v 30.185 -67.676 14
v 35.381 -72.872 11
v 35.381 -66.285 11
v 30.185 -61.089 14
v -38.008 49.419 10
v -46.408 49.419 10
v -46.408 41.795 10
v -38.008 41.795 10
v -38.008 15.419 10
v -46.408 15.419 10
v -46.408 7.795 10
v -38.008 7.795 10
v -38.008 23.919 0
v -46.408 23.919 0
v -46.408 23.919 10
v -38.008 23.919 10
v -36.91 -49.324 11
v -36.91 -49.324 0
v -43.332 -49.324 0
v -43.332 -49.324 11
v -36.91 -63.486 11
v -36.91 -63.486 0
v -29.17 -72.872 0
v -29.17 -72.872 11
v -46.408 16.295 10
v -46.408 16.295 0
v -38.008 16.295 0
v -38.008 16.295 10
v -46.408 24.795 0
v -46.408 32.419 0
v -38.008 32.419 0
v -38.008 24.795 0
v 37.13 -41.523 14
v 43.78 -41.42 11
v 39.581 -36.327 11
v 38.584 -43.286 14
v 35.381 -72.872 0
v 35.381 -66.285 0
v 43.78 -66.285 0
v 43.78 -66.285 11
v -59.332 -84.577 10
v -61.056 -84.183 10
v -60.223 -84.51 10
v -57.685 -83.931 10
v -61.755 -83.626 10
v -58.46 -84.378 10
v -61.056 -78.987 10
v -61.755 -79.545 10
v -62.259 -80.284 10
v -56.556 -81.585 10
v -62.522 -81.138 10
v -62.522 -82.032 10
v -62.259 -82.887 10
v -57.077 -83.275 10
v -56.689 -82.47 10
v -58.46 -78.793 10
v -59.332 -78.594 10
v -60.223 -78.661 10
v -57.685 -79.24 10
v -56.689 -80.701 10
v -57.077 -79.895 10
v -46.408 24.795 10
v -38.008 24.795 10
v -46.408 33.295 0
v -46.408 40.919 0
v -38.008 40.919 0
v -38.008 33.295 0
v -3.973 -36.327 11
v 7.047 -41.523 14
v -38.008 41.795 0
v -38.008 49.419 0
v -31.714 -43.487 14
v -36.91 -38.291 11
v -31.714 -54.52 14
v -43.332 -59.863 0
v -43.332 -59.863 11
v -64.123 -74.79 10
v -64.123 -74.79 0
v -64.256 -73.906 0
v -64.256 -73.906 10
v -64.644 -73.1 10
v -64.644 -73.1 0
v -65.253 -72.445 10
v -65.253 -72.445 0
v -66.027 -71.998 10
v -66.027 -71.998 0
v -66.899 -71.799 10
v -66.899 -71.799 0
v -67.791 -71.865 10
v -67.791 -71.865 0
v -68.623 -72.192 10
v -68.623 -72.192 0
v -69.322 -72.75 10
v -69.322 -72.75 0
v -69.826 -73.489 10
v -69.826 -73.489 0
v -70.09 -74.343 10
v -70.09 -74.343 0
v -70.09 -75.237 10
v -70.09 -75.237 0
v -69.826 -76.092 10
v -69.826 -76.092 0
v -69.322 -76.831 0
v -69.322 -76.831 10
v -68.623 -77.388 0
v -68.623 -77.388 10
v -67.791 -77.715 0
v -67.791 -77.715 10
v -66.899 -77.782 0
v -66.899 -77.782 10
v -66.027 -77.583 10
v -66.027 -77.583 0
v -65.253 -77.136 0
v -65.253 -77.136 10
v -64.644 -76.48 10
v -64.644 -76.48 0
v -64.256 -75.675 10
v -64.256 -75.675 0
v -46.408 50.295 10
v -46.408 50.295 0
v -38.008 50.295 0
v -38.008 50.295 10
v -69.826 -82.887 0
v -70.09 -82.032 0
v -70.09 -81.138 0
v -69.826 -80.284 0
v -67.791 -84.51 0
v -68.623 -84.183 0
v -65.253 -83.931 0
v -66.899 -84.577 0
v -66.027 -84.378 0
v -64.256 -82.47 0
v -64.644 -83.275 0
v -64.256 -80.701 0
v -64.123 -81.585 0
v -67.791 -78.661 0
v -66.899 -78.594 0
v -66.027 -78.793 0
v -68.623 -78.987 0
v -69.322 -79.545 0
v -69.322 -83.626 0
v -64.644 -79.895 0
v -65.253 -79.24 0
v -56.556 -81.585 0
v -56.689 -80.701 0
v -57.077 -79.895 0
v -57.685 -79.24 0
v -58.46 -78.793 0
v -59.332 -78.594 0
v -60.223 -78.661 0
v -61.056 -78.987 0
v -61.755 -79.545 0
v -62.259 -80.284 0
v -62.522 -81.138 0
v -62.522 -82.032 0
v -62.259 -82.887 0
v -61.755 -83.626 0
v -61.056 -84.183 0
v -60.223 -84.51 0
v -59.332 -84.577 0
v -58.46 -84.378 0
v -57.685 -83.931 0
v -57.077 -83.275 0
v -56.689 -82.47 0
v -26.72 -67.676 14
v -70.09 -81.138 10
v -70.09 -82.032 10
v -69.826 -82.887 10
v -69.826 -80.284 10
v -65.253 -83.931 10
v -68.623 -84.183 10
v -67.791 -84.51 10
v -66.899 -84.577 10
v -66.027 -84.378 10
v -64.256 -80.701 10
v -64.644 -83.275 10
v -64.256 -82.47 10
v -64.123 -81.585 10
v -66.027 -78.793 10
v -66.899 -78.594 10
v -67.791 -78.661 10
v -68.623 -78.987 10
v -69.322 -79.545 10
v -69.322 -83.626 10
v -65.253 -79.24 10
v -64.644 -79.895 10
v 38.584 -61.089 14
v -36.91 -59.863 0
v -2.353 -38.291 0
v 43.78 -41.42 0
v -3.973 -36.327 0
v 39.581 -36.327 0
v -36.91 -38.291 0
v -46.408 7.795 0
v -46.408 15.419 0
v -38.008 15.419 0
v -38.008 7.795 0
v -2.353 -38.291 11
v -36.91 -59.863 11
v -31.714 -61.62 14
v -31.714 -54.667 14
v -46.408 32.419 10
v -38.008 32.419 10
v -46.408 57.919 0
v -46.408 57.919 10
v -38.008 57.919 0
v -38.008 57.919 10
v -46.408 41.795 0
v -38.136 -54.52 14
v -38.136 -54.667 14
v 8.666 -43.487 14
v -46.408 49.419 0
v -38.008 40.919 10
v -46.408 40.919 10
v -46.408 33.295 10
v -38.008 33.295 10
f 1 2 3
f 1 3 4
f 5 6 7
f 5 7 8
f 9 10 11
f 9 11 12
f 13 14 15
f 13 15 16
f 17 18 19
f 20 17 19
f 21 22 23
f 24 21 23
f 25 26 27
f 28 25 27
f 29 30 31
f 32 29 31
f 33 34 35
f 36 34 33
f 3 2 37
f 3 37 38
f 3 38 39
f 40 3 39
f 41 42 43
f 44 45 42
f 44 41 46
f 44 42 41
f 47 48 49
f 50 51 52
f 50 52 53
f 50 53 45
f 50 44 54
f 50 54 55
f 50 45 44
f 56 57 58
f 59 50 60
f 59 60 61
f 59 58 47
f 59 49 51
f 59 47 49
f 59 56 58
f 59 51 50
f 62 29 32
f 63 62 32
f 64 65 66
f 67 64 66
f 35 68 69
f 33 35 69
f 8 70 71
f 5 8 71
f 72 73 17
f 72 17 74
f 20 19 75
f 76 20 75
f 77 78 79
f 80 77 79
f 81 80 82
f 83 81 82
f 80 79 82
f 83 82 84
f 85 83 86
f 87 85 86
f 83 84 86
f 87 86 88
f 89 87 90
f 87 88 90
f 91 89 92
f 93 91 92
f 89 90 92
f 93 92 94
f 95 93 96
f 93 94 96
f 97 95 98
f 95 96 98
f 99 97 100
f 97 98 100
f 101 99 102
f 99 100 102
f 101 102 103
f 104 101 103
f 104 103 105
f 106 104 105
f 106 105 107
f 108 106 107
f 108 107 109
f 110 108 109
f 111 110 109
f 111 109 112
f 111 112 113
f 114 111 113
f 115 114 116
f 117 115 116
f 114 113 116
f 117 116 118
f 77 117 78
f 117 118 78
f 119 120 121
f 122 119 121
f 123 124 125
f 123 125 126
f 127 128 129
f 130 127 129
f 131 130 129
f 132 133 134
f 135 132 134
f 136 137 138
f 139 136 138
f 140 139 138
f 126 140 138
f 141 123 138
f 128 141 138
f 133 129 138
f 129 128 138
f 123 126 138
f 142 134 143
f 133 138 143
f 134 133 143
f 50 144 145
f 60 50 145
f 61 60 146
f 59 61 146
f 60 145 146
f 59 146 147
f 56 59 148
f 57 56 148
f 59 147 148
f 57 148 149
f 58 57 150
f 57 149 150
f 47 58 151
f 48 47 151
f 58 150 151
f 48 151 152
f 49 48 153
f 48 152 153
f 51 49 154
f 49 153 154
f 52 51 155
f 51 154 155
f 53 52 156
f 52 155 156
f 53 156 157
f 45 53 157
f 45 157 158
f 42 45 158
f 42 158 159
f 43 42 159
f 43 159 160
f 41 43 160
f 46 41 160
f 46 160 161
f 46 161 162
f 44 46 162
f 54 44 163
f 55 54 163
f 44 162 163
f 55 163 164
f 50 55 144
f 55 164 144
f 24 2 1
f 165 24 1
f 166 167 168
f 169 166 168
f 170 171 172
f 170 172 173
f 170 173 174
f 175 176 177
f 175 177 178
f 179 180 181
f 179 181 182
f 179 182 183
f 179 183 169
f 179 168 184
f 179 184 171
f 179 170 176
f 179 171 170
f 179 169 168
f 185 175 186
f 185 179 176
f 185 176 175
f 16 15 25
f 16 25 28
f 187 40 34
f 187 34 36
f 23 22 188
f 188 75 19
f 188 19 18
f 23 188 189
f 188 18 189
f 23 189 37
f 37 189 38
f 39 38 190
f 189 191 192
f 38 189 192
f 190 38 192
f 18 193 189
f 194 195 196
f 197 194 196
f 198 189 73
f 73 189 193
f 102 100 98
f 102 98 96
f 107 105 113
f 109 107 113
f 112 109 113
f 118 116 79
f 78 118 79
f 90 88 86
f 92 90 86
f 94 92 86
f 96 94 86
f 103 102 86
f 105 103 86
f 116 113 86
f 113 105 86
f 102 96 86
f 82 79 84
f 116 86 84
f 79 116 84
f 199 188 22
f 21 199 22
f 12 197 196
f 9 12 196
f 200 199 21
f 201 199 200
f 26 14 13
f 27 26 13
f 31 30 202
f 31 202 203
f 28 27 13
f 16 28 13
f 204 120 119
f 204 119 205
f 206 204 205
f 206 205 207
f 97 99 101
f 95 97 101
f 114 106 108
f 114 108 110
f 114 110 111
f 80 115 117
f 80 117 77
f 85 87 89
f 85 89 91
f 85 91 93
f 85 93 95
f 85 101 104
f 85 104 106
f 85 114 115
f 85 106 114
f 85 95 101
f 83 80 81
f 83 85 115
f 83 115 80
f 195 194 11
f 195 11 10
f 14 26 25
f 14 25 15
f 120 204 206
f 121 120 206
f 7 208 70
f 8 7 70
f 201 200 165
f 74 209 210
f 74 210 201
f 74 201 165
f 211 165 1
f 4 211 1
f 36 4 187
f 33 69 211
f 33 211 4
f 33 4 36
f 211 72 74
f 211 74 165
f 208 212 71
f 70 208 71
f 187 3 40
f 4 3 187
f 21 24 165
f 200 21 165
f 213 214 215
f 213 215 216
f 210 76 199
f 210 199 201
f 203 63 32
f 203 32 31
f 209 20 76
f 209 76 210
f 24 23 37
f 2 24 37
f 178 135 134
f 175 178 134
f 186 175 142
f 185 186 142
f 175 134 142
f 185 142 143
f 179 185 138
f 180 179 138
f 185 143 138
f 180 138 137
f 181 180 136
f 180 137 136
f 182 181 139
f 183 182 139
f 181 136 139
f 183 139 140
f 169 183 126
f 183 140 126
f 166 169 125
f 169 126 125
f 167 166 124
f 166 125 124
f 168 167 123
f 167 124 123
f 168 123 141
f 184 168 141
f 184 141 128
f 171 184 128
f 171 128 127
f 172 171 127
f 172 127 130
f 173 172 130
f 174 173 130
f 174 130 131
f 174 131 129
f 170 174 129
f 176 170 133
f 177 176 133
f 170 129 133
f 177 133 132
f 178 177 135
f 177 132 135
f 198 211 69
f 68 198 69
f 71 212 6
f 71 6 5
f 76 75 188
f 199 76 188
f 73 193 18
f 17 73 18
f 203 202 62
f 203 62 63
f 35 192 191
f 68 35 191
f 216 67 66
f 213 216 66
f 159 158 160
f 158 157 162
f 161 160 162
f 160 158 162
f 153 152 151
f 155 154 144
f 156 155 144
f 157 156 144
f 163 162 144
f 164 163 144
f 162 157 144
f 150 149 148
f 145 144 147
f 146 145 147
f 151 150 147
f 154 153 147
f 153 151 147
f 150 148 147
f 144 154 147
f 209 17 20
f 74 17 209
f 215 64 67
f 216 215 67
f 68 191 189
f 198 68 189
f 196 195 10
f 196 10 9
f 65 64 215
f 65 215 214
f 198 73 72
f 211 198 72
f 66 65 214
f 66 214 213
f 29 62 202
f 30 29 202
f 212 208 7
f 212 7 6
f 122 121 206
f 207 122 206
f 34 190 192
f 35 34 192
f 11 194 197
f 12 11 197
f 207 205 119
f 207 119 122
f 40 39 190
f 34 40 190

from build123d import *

# Parameters (mm, degrees)
EXTRUDE_1_DEPTH   = 14
SKETCH_2_R        = 3
EXTRUDE_2_DEPTH   = 10
EXTRUDE_2_2_DEPTH = 10
EXTRUDE_2_3_DEPTH = 10
SKETCH_2_W        = 8.399311933
SKETCH_2_H        = 7.623990832
EXTRUDE_2_4_DEPTH = 10
EXTRUDE_2_5_DEPTH = 10
EXTRUDE_2_6_DEPTH = 10
EXTRUDE_2_7_DEPTH = 10
EXTRUDE_2_8_DEPTH = 10
EXTRUDE_2_9_DEPTH = 10


with BuildPart() as part:
    # Эскиз1 → Бобышка-Вытянуть1 (new body)
    with BuildSketch(Plane.XY):
        Polygon((-36.909889511, -38.291088482), (-36.909889511, -49.324157276), (-43.332123585, -49.324157276), (-43.332123585, -59.863208064), (-36.909889511, -59.863208064), (-36.909889511, -63.486006772), (-29.170274088, -72.87234888), (35.381411989, -72.87234888), (35.381411989, -66.285442138), (43.779718086, -66.285442138), (43.779718086, -41.419869184), (39.580565037, -36.327279317), (-3.972709406, -36.327279317), (-2.353428165, -38.291088482), align=None)
    extrude(amount=EXTRUDE_1_DEPTH)

    # Фаска1
    # the kernel refuses this chamfer: 5.196152423, 3 mm, written as the material it takes off along each edge
    with BuildSketch(Plane(origin=(-36.909889511, -49.324157276, 14), x_dir=(0, 0.0578938624026709, -0.9983227437537926), z_dir=(-1, 0, 0)), Plane(origin=(-43.332123585, -59.863208064, 14), x_dir=(0, -0.0578938624026709, -0.9983227437537926), z_dir=(1, 0, 0))) as chamfer_1_piece_1:
        with BuildLine():
            Line((3.109137869, 0), (-0.414994971, 5.361118731))
            Line((-0.414994971, 5.361118731), (-0.518743714, 5.355102224))
            ThreePointArc((-0.518743714, 5.355102224), (-0.259371857, 2.677551112), (-0.103748743, -0.006016507))
            Line((-0.103748743, -0.006016507), (0.006016507, -0.103748743))
            ThreePointArc((0.006016507, -0.103748743), (1.555374994, -0.013899696), (3.115154376, -0.103748743))
            Line((3.115154376, -0.103748743), (3.109137869, 0))
        make_face()
    extrude(amount=6.422234074, mode=Mode.SUBTRACT)
    with BuildSketch(Plane(origin=(-43.332123585, -49.324157276, 14), x_dir=(-0.0578938624026709, 0, -0.9983227437537926), z_dir=(0, -1, 0))) as chamfer_1_piece_2:
        with BuildLine():
            Line((3.109137869, 0), (-0.414994971, 5.361118731))
            Line((-0.414994971, 5.361118731), (-0.518743714, 5.355102224))
            ThreePointArc((-0.518743714, 5.355102224), (-0.259371857, 2.677551112), (-0.103748743, -0.006016507))
            Line((-0.103748743, -0.006016507), (0.006016507, -0.103748743))
            ThreePointArc((0.006016507, -0.103748743), (1.555374994, -0.013899696), (3.115154376, -0.103748743))
            Line((3.115154376, -0.103748743), (3.109137869, 0))
        make_face()
    extrude(amount=10.539050788, mode=Mode.SUBTRACT)
    with BuildSketch(Plane(origin=(-36.909889511, -59.863208064, 14), x_dir=(-0.0578938624026709, 0, -0.9983227437537926), z_dir=(0, -1, 0))) as chamfer_1_piece_3_section:
        with BuildLine():
            Line((3.109137869, 0), (-0.414994971, 5.361118731))
            Line((-0.414994971, 5.361118731), (-0.518743714, 5.355102224))
            ThreePointArc((-0.518743714, 5.355102224), (-0.259371857, 2.677551112), (-0.103748743, -0.006016507))
            Line((-0.103748743, -0.006016507), (0.006016507, -0.103748743))
            ThreePointArc((0.006016507, -0.103748743), (1.555374994, -0.013899696), (3.115154376, -0.103748743))
            Line((3.115154376, -0.103748743), (3.109137869, 0))
        make_face()
    chamfer_1_piece_3 = extrude(amount=17.06569062, mode=Mode.PRIVATE)
    chamfer_1_piece_3 = split(chamfer_1_piece_3, bisect_by=Plane(origin=(-36.310735652, -64.212640175, 13.15573984), z_dir=(0.7715393663129642, 0.6361815827492885, 0)), keep=Keep.TOP, mode=Mode.PRIVATE)
    add(chamfer_1_piece_3, mode=Mode.SUBTRACT)
    with BuildSketch(Plane(origin=(-45.462009764, -53.114286465, 14), x_dir=(-0.04466739391156679, -0.03683100901480082, -0.9983227437537926), z_dir=(0.6361815827492885, -0.7715393663129642, 0))) as chamfer_1_piece_4_section:
        with BuildLine():
            Line((3.109137869, 0), (-0.414994971, 5.361118731))
            Line((-0.414994971, 5.361118731), (-0.518743714, 5.355102224))
            ThreePointArc((-0.518743714, 5.355102224), (-0.259371857, 2.677551112), (-0.103748743, -0.006016507))
            Line((-0.103748743, -0.006016507), (0.006016507, -0.103748743))
            ThreePointArc((0.006016507, -0.103748743), (1.555374994, -0.013899696), (3.115154376, -0.103748743))
            Line((3.115154376, -0.103748743), (3.109137869, 0))
        make_face()
    chamfer_1_piece_4 = extrude(amount=39.051517055, mode=Mode.PRIVATE)
    chamfer_1_piece_4 = split(chamfer_1_piece_4, bisect_by=Plane(origin=(-36.909889511, -66.628217191, 13.110188551), z_dir=(1, 0, 0)), keep=Keep.TOP, mode=Mode.PRIVATE)
    chamfer_1_piece_4 = split(chamfer_1_piece_4, bisect_by=Plane(origin=(-31.761219521, -72.87234888, 13.110188551), z_dir=(0, 1, 0)), keep=Keep.TOP, mode=Mode.PRIVATE)
    add(chamfer_1_piece_4, mode=Mode.SUBTRACT)
    with BuildSketch(Plane(origin=(-42.613166, -72.87234888, 14), x_dir=(0, -0.05789386240267318, -0.9983227437537925), z_dir=(1, 0, 0))) as chamfer_1_piece_5_section:
        with BuildLine():
            Line((3.109137869, 0), (-0.414994971, 5.361118731))
            Line((-0.414994971, 5.361118731), (-0.518743714, 5.355102224))
            ThreePointArc((-0.518743714, 5.355102224), (-0.259371857, 2.677551112), (-0.103748743, -0.006016507))
            Line((-0.103748743, -0.006016507), (0.006016507, -0.103748743))
            ThreePointArc((0.006016507, -0.103748743), (1.555374994, -0.013899696), (3.115154376, -0.103748743))
            Line((3.115154376, -0.103748743), (3.109137869, 0))
        make_face()
    chamfer_1_piece_5 = extrude(amount=77.994577989, mode=Mode.PRIVATE)
    chamfer_1_piece_5 = split(chamfer_1_piece_5, bisect_by=Plane(origin=(-17.2681662, -87.306820149, 13.044949629), z_dir=(0.7715393663129642, 0.6361815827492885, 0)), keep=Keep.TOP, mode=Mode.PRIVATE)
    add(chamfer_1_piece_5, mode=Mode.SUBTRACT)
    with BuildSketch(Plane(origin=(35.381411989, -72.87234888, 14), x_dir=(0.0578938624026709, 0, -0.9983227437537926), z_dir=(0, 1, 0))) as chamfer_1_piece_6:
        with BuildLine():
            Line((3.109137869, 0), (-0.414994971, 5.361118731))
            Line((-0.414994971, 5.361118731), (-0.518743714, 5.355102224))
            ThreePointArc((-0.518743714, 5.355102224), (-0.259371857, 2.677551112), (-0.103748743, -0.006016507))
            Line((-0.103748743, -0.006016507), (0.006016507, -0.103748743))
            ThreePointArc((0.006016507, -0.103748743), (1.555374994, -0.013899696), (3.115154376, -0.103748743))
            Line((3.115154376, -0.103748743), (3.109137869, 0))
        make_face()
    extrude(amount=6.586906743, mode=Mode.SUBTRACT)
    with BuildSketch(Plane(origin=(35.381411989, -66.285442138, 14), x_dir=(0, -0.05789386240267318, -0.9983227437537925), z_dir=(1, 0, 0))) as chamfer_1_piece_7:
        with BuildLine():
            Line((3.109137869, 0), (-0.414994971, 5.361118731))
            Line((-0.414994971, 5.361118731), (-0.518743714, 5.355102224))
            ThreePointArc((-0.518743714, 5.355102224), (-0.259371857, 2.677551112), (-0.103748743, -0.006016507))
            Line((-0.103748743, -0.006016507), (0.006016507, -0.103748743))
            ThreePointArc((0.006016507, -0.103748743), (1.555374994, -0.013899696), (3.115154376, -0.103748743))
            Line((3.115154376, -0.103748743), (3.109137869, 0))
        make_face()
    extrude(amount=8.398306097, mode=Mode.SUBTRACT)
    with BuildSketch(Plane(origin=(43.779718086, -66.285442138, 14), x_dir=(0.0578938624026709, 0, -0.9983227437537926), z_dir=(0, 1, 0))) as chamfer_1_piece_8_section:
        with BuildLine():
            Line((3.109137869, 0), (-0.414994971, 5.361118731))
            Line((-0.414994971, 5.361118731), (-0.518743714, 5.355102224))
            ThreePointArc((-0.518743714, 5.355102224), (-0.259371857, 2.677551112), (-0.103748743, -0.006016507))
            Line((-0.103748743, -0.006016507), (0.006016507, -0.103748743))
            ThreePointArc((0.006016507, -0.103748743), (1.555374994, -0.013899696), (3.115154376, -0.103748743))
            Line((3.115154376, -0.103748743), (3.109137869, 0))
        make_face()
    chamfer_1_piece_8 = extrude(amount=38.308464865, mode=Mode.PRIVATE)
    chamfer_1_piece_8 = split(chamfer_1_piece_8, bisect_by=Plane(origin=(48.602023871, -47.268197478, 13.0630262), z_dir=(-0.7715393663129643, -0.6361815827492884, 0)), keep=Keep.TOP, mode=Mode.PRIVATE)
    add(chamfer_1_piece_8, mode=Mode.SUBTRACT)
    with BuildSketch(Plane(origin=(52.331838339, -51.791589491, 14), x_dir=(0.04466739391156704, 0.036831009014801006, -0.9983227437537926), z_dir=(-0.6361815827492884, 0.7715393663129643, 0))) as chamfer_1_piece_9_section:
        with BuildLine():
            Line((3.109137869, 0), (-0.414994971, 5.361118731))
            Line((-0.414994971, 5.361118731), (-0.518743714, 5.355102224))
            ThreePointArc((-0.518743714, 5.355102224), (-0.259371857, 2.677551112), (-0.103748743, -0.006016507))
            Line((-0.103748743, -0.006016507), (0.006016507, -0.103748743))
            ThreePointArc((0.006016507, -0.103748743), (1.555374994, -0.013899696), (3.115154376, -0.103748743))
            Line((3.115154376, -0.103748743), (3.109137869, 0))
        make_face()
    chamfer_1_piece_9 = extrude(amount=33.486341215, mode=Mode.PRIVATE)
    chamfer_1_piece_9 = split(chamfer_1_piece_9, bisect_by=Plane(origin=(43.779718086, -40.523934217, 13.149770443), z_dir=(-1, 0, 0)), keep=Keep.TOP, mode=Mode.PRIVATE)
    chamfer_1_piece_9 = split(chamfer_1_piece_9, bisect_by=Plane(origin=(40.319318432, -36.327279317, 13.149770443), z_dir=(0, -1, 0)), keep=Keep.TOP, mode=Mode.PRIVATE)
    add(chamfer_1_piece_9, mode=Mode.SUBTRACT)
    with BuildSketch(Plane(origin=(11.089463747, -38.291088482, 14), x_dir=(0, 0.0578938624026709, -0.9983227437537926), z_dir=(-1, 0, 0))) as chamfer_1_piece_10_section:
        with BuildLine():
            Line((3.109137869, 0), (-0.414994971, 5.361118731))
            Line((-0.414994971, 5.361118731), (-0.518743714, 5.355102224))
            ThreePointArc((-0.518743714, 5.355102224), (-0.259371857, 2.677551112), (-0.103748743, -0.006016507))
            Line((-0.103748743, -0.006016507), (0.006016507, -0.103748743))
            ThreePointArc((0.006016507, -0.103748743), (1.555374994, -0.013899696), (3.115154376, -0.103748743))
            Line((3.115154376, -0.103748743), (3.109137869, 0))
        make_face()
    chamfer_1_piece_10 = extrude(amount=47.999353257, mode=Mode.PRIVATE)
    chamfer_1_piece_10 = split(chamfer_1_piece_10, bisect_by=Plane(origin=(-8.173409607, -31.232813116, 13.050749195), z_dir=(-0.7715393663129635, -0.6361815827492894, 0)), keep=Keep.TOP, mode=Mode.PRIVATE)
    add(chamfer_1_piece_10, mode=Mode.SUBTRACT)
    with BuildSketch(Plane(origin=(53.023456949, -36.327279317, 14), x_dir=(0, 0.0578938624026709, -0.9983227437537926), z_dir=(-1, 0, 0))) as chamfer_1_piece_11_section:
        with BuildLine():
            Line((3.109137869, 0), (-0.414994971, 5.361118731))
            Line((-0.414994971, 5.361118731), (-0.518743714, 5.355102224))
            ThreePointArc((-0.518743714, 5.355102224), (-0.259371857, 2.677551112), (-0.103748743, -0.006016507))
            Line((-0.103748743, -0.006016507), (0.006016507, -0.103748743))
            ThreePointArc((0.006016507, -0.103748743), (1.555374994, -0.013899696), (3.115154376, -0.103748743))
            Line((3.115154376, -0.103748743), (3.109137869, 0))
        make_face()
    chamfer_1_piece_11 = extrude(amount=70.439058267, mode=Mode.PRIVATE)
    chamfer_1_piece_11 = split(chamfer_1_piece_11, bisect_by=Plane(origin=(32.203932865, -27.381150939, 13.037990314), z_dir=(-0.7715393663129643, -0.6361815827492884, 0)), keep=Keep.TOP, mode=Mode.PRIVATE)
    chamfer_1_piece_11 = split(chamfer_1_piece_11, bisect_by=Plane(origin=(6.277844799, -48.758802502, 13.037990314), z_dir=(0.7715393663129635, 0.6361815827492894, 0)), keep=Keep.TOP, mode=Mode.PRIVATE)
    add(chamfer_1_piece_11, mode=Mode.SUBTRACT)
    with BuildSketch(Plane(origin=(-12.524829659, -25.95555901, 14), x_dir=(-0.04466739391156709, -0.03683100901480115, -0.9983227437537926), z_dir=(0.6361815827492894, -0.7715393663129635, 0))) as chamfer_1_piece_12_section:
        with BuildLine():
            Line((3.109137869, 0), (-0.414994971, 5.361118731))
            Line((-0.414994971, 5.361118731), (-0.518743714, 5.355102224))
            ThreePointArc((-0.518743714, 5.355102224), (-0.259371857, 2.677551112), (-0.103748743, -0.006016507))
            Line((-0.103748743, -0.006016507), (0.006016507, -0.103748743))
            ThreePointArc((0.006016507, -0.103748743), (1.555374994, -0.013899696), (3.115154376, -0.103748743))
            Line((3.115154376, -0.103748743), (3.109137869, 0))
        make_face()
    chamfer_1_piece_12 = extrude(amount=29.431096805, mode=Mode.PRIVATE)
    chamfer_1_piece_12 = split(chamfer_1_piece_12, bisect_by=Plane(origin=(-6.345177041, -38.291088482, 13.06885324), z_dir=(0, 1, 0)), keep=Keep.TOP, mode=Mode.PRIVATE)
    add(chamfer_1_piece_12, mode=Mode.SUBTRACT)
    with BuildSketch(Plane(origin=(-36.909889511, -38.291088482, 14), x_dir=(-0.0578938624026709, 0, -0.9983227437537926), z_dir=(0, -1, 0))) as chamfer_1_piece_13:
        with BuildLine():
            Line((3.109137869, 0), (-0.414994971, 5.361118731))
            Line((-0.414994971, 5.361118731), (-0.518743714, 5.355102224))
            ThreePointArc((-0.518743714, 5.355102224), (-0.259371857, 2.677551112), (-0.103748743, -0.006016507))
            Line((-0.103748743, -0.006016507), (0.006016507, -0.103748743))
            ThreePointArc((0.006016507, -0.103748743), (1.555374994, -0.013899696), (3.115154376, -0.103748743))
            Line((3.115154376, -0.103748743), (3.109137869, 0))
        make_face()
    extrude(amount=11.033068794, mode=Mode.SUBTRACT)
    with BuildSketch(Plane(origin=(-36.909889511, -38.291088482, 14), x_dir=(-0.0578938624026709, 0, -0.9983227437537926), z_dir=(0, -1, 0))) as chamfer_1_piece_14a_section:
        with BuildLine():
            Line((3.109137869, 0), (-0.414994971, 5.361118731))
            Line((-0.414994971, 5.361118731), (-0.518743714, 5.355102224))
            ThreePointArc((-0.518743714, 5.355102224), (-0.259371857, 2.677551112), (-0.103748743, -0.006016507))
            Line((-0.103748743, -0.006016507), (0.006016507, -0.103748743))
            ThreePointArc((0.006016507, -0.103748743), (1.555374994, -0.013899696), (3.115154376, -0.103748743))
            Line((3.115154376, -0.103748743), (3.109137869, 0))
        make_face()
    chamfer_1_piece_14a = extrude(amount=24.475960706, mode=Mode.PRIVATE)
    chamfer_1_piece_14a = split(chamfer_1_piece_14a, bisect_by=Plane(origin=(-35.167192108, -49.324157276, 13.037990314), z_dir=(0, -1, 0)), keep=Keep.TOP, mode=Mode.PRIVATE)
    with BuildSketch(Plane(origin=(-23.466997599, -49.324157276, 14), x_dir=(0, 0.0578938624026709, -0.9983227437537926), z_dir=(-1, 0, 0))) as chamfer_1_piece_14b_section:
        with BuildLine():
            Line((3.109137869, 0), (-0.414994971, 5.361118731))
            Line((-0.414994971, 5.361118731), (-0.518743714, 5.355102224))
            ThreePointArc((-0.518743714, 5.355102224), (-0.259371857, 2.677551112), (-0.103748743, -0.006016507))
            Line((-0.103748743, -0.006016507), (0.006016507, -0.103748743))
            ThreePointArc((0.006016507, -0.103748743), (1.555374994, -0.013899696), (3.115154376, -0.103748743))
            Line((3.115154376, -0.103748743), (3.109137869, 0))
        make_face()
    chamfer_1_piece_14b = extrude(amount=19.865125986, mode=Mode.PRIVATE)
    chamfer_1_piece_14b = split(chamfer_1_piece_14b, bisect_by=Plane(origin=(-36.909889511, -51.066854679, 13.037990314), z_dir=(1, 0, 0)), keep=Keep.TOP, mode=Mode.PRIVATE)
    chamfer_1_piece_14 = chamfer_1_piece_14a & chamfer_1_piece_14b
    add(chamfer_1_piece_14, mode=Mode.SUBTRACT)
    with BuildSketch(Plane(origin=(-36.909889511, -49.324157276, 14), x_dir=(0, 0.0578938624026709, -0.9983227437537926), z_dir=(-1, 0, 0))) as chamfer_1_piece_15a_section:
        with BuildLine():
            Line((3.109137869, 0), (-0.414994971, 5.361118731))
            Line((-0.414994971, 5.361118731), (-0.518743714, 5.355102224))
            ThreePointArc((-0.518743714, 5.355102224), (-0.259371857, 2.677551112), (-0.103748743, -0.006016507))
            Line((-0.103748743, -0.006016507), (0.006016507, -0.103748743))
            ThreePointArc((0.006016507, -0.103748743), (1.555374994, -0.013899696), (3.115154376, -0.103748743))
            Line((3.115154376, -0.103748743), (3.109137869, 0))
        make_face()
    chamfer_1_piece_15a = extrude(amount=19.865125986, mode=Mode.PRIVATE)
    chamfer_1_piece_15a = split(chamfer_1_piece_15a, bisect_by=Plane(origin=(-43.332123585, -51.066854679, 13.037990314), z_dir=(-1, 0, 0)), keep=Keep.TOP, mode=Mode.PRIVATE)
    with BuildSketch(Plane(origin=(-43.332123585, -35.881265364, 14), x_dir=(-0.0578938624026709, 0, -0.9983227437537926), z_dir=(0, -1, 0))) as chamfer_1_piece_15b_section:
        with BuildLine():
            Line((3.109137869, 0), (-0.414994971, 5.361118731))
            Line((-0.414994971, 5.361118731), (-0.518743714, 5.355102224))
            ThreePointArc((-0.518743714, 5.355102224), (-0.259371857, 2.677551112), (-0.103748743, -0.006016507))
            Line((-0.103748743, -0.006016507), (0.006016507, -0.103748743))
            ThreePointArc((0.006016507, -0.103748743), (1.555374994, -0.013899696), (3.115154376, -0.103748743))
            Line((3.115154376, -0.103748743), (3.109137869, 0))
        make_face()
    chamfer_1_piece_15b = extrude(amount=23.9819427, mode=Mode.PRIVATE)
    chamfer_1_piece_15b = split(chamfer_1_piece_15b, bisect_by=Plane(origin=(-41.589426182, -49.324157276, 13.037990314), z_dir=(0, 1, 0)), keep=Keep.TOP, mode=Mode.PRIVATE)
    chamfer_1_piece_15 = chamfer_1_piece_15a & chamfer_1_piece_15b
    add(chamfer_1_piece_15, mode=Mode.SUBTRACT)
    with BuildSketch(Plane(origin=(-43.332123585, -49.324157276, 14), x_dir=(-0.0578938624026709, 0, -0.9983227437537926), z_dir=(0, -1, 0))) as chamfer_1_piece_16a_section:
        with BuildLine():
            Line((3.109137869, 0), (-0.414994971, 5.361118731))
            Line((-0.414994971, 5.361118731), (-0.518743714, 5.355102224))
            ThreePointArc((-0.518743714, 5.355102224), (-0.259371857, 2.677551112), (-0.103748743, -0.006016507))
            Line((-0.103748743, -0.006016507), (0.006016507, -0.103748743))
            ThreePointArc((0.006016507, -0.103748743), (1.555374994, -0.013899696), (3.115154376, -0.103748743))
            Line((3.115154376, -0.103748743), (3.109137869, 0))
        make_face()
    chamfer_1_piece_16a = extrude(amount=23.9819427, mode=Mode.PRIVATE)
    chamfer_1_piece_16a = split(chamfer_1_piece_16a, bisect_by=Plane(origin=(-41.589426182, -59.863208064, 13.037990314), z_dir=(0, -1, 0)), keep=Keep.TOP, mode=Mode.PRIVATE)
    with BuildSketch(Plane(origin=(-56.775015497, -59.863208064, 14), x_dir=(0, -0.0578938624026709, -0.9983227437537926), z_dir=(1, 0, 0))) as chamfer_1_piece_16b_section:
        with BuildLine():
            Line((3.109137869, 0), (-0.414994971, 5.361118731))
            Line((-0.414994971, 5.361118731), (-0.518743714, 5.355102224))
            ThreePointArc((-0.518743714, 5.355102224), (-0.259371857, 2.677551112), (-0.103748743, -0.006016507))
            Line((-0.103748743, -0.006016507), (0.006016507, -0.103748743))
            ThreePointArc((0.006016507, -0.103748743), (1.555374994, -0.013899696), (3.115154376, -0.103748743))
            Line((3.115154376, -0.103748743), (3.109137869, 0))
        make_face()
    chamfer_1_piece_16b = extrude(amount=19.865125986, mode=Mode.PRIVATE)
    chamfer_1_piece_16b = split(chamfer_1_piece_16b, bisect_by=Plane(origin=(-43.332123585, -58.120510661, 13.037990314), z_dir=(-1, 0, 0)), keep=Keep.TOP, mode=Mode.PRIVATE)
    chamfer_1_piece_16 = chamfer_1_piece_16a & chamfer_1_piece_16b
    add(chamfer_1_piece_16, mode=Mode.SUBTRACT)
    with BuildSketch(Plane(origin=(-43.332123585, -59.863208064, 14), x_dir=(0, -0.0578938624026709, -0.9983227437537926), z_dir=(1, 0, 0))) as chamfer_1_piece_17a_section:
        with BuildLine():
            Line((3.109137869, 0), (-0.414994971, 5.361118731))
            Line((-0.414994971, 5.361118731), (-0.518743714, 5.355102224))
            ThreePointArc((-0.518743714, 5.355102224), (-0.259371857, 2.677551112), (-0.103748743, -0.006016507))
            Line((-0.103748743, -0.006016507), (0.006016507, -0.103748743))
            ThreePointArc((0.006016507, -0.103748743), (1.555374994, -0.013899696), (3.115154376, -0.103748743))
            Line((3.115154376, -0.103748743), (3.109137869, 0))
        make_face()
    chamfer_1_piece_17a = extrude(amount=19.865125986, mode=Mode.PRIVATE)
    chamfer_1_piece_17a = split(chamfer_1_piece_17a, bisect_by=Plane(origin=(-36.909889511, -58.120510661, 13.037990314), z_dir=(1, 0, 0)), keep=Keep.TOP, mode=Mode.PRIVATE)
    with BuildSketch(Plane(origin=(-36.909889511, -46.420316152, 14), x_dir=(-0.0578938624026709, 0, -0.9983227437537926), z_dir=(0, -1, 0))) as chamfer_1_piece_17b_section:
        with BuildLine():
            Line((3.109137869, 0), (-0.414994971, 5.361118731))
            Line((-0.414994971, 5.361118731), (-0.518743714, 5.355102224))
            ThreePointArc((-0.518743714, 5.355102224), (-0.259371857, 2.677551112), (-0.103748743, -0.006016507))
            Line((-0.103748743, -0.006016507), (0.006016507, -0.103748743))
            ThreePointArc((0.006016507, -0.103748743), (1.555374994, -0.013899696), (3.115154376, -0.103748743))
            Line((3.115154376, -0.103748743), (3.109137869, 0))
        make_face()
    chamfer_1_piece_17b = extrude(amount=30.508582532, mode=Mode.PRIVATE)
    chamfer_1_piece_17b = split(chamfer_1_piece_17b, bisect_by=Plane(origin=(-35.167192108, -59.863208064, 13.037990314), z_dir=(0, 1, 0)), keep=Keep.TOP, mode=Mode.PRIVATE)
    chamfer_1_piece_17 = chamfer_1_piece_17a & chamfer_1_piece_17b
    add(chamfer_1_piece_17, mode=Mode.SUBTRACT)
    with BuildSketch(Plane(origin=(-36.909889511, -59.863208064, 14), x_dir=(-0.0578938624026709, 0, -0.9983227437537926), z_dir=(0, -1, 0))) as chamfer_1_piece_18a_section:
        with BuildLine():
            Line((3.109137869, 0), (-0.414994971, 5.361118731))
            Line((-0.414994971, 5.361118731), (-0.518743714, 5.355102224))
            ThreePointArc((-0.518743714, 5.355102224), (-0.259371857, 2.677551112), (-0.103748743, -0.006016507))
            Line((-0.103748743, -0.006016507), (0.006016507, -0.103748743))
            ThreePointArc((0.006016507, -0.103748743), (1.555374994, -0.013899696), (3.115154376, -0.103748743))
            Line((3.115154376, -0.103748743), (3.109137869, 0))
        make_face()
    chamfer_1_piece_18a = extrude(amount=17.06569062, mode=Mode.PRIVATE)
    chamfer_1_piece_18a = split(chamfer_1_piece_18a, bisect_by=Plane(origin=(-32.520529526, -68.809273136, 12.978371613), z_dir=(-0.7715393663129642, -0.6361815827492885, 0)), keep=Keep.TOP, mode=Mode.PRIVATE)
    with BuildSketch(Plane(origin=(-45.462009764, -53.114286465, 14), x_dir=(-0.04466739391156679, -0.03683100901480082, -0.9983227437537926), z_dir=(0.6361815827492885, -0.7715393663129642, 0))) as chamfer_1_piece_18b_section:
        with BuildLine():
            Line((3.109137869, 0), (-0.414994971, 5.361118731))
            Line((-0.414994971, 5.361118731), (-0.518743714, 5.355102224))
            ThreePointArc((-0.518743714, 5.355102224), (-0.259371857, 2.677551112), (-0.103748743, -0.006016507))
            Line((-0.103748743, -0.006016507), (0.006016507, -0.103748743))
            ThreePointArc((0.006016507, -0.103748743), (1.555374994, -0.013899696), (3.115154376, -0.103748743))
            Line((3.115154376, -0.103748743), (3.109137869, 0))
        make_face()
    chamfer_1_piece_18b = extrude(amount=39.051517055, mode=Mode.PRIVATE)
    chamfer_1_piece_18b = split(chamfer_1_piece_18b, bisect_by=Plane(origin=(-36.909889511, -56.586467233, 12.978371613), z_dir=(-1, 0, 0)), keep=Keep.TOP, mode=Mode.PRIVATE)
    chamfer_1_piece_18 = chamfer_1_piece_18a & chamfer_1_piece_18b
    add(chamfer_1_piece_18, mode=Mode.SUBTRACT)
    with BuildSketch(Plane(origin=(-45.462009764, -53.114286465, 14), x_dir=(-0.04466739391156679, -0.03683100901480082, -0.9983227437537926), z_dir=(0.6361815827492885, -0.7715393663129642, 0))) as chamfer_1_piece_19a_section:
        with BuildLine():
            Line((3.109137869, 0), (-0.414994971, 5.361118731))
            Line((-0.414994971, 5.361118731), (-0.518743714, 5.355102224))
            ThreePointArc((-0.518743714, 5.355102224), (-0.259371857, 2.677551112), (-0.103748743, -0.006016507))
            Line((-0.103748743, -0.006016507), (0.006016507, -0.103748743))
            ThreePointArc((0.006016507, -0.103748743), (1.555374994, -0.013899696), (3.115154376, -0.103748743))
            Line((3.115154376, -0.103748743), (3.109137869, 0))
        make_face()
    chamfer_1_piece_19a = extrude(amount=39.051517055, mode=Mode.PRIVATE)
    chamfer_1_piece_19a = split(chamfer_1_piece_19a, bisect_by=Plane(origin=(-23.218923028, -72.87234888, 12.999739571), z_dir=(0, -1, 0)), keep=Keep.TOP, mode=Mode.PRIVATE)
    with BuildSketch(Plane(origin=(-42.613166, -72.87234888, 14), x_dir=(0, -0.05789386240267318, -0.9983227437537925), z_dir=(1, 0, 0))) as chamfer_1_piece_19b_section:
        with BuildLine():
            Line((3.109137869, 0), (-0.414994971, 5.361118731))
            Line((-0.414994971, 5.361118731), (-0.518743714, 5.355102224))
            ThreePointArc((-0.518743714, 5.355102224), (-0.259371857, 2.677551112), (-0.103748743, -0.006016507))
            Line((-0.103748743, -0.006016507), (0.006016507, -0.103748743))
            ThreePointArc((0.006016507, -0.103748743), (1.555374994, -0.013899696), (3.115154376, -0.103748743))
            Line((3.115154376, -0.103748743), (3.109137869, 0))
        make_face()
    chamfer_1_piece_19b = extrude(amount=77.994577989, mode=Mode.PRIVATE)
    chamfer_1_piece_19b = split(chamfer_1_piece_19b, bisect_by=Plane(origin=(-32.956414026, -68.280647254, 12.999739571), z_dir=(-0.7715393663129642, -0.6361815827492885, 0)), keep=Keep.TOP, mode=Mode.PRIVATE)
    chamfer_1_piece_19 = chamfer_1_piece_19a & chamfer_1_piece_19b
    add(chamfer_1_piece_19, mode=Mode.SUBTRACT)
    with BuildSketch(Plane(origin=(-42.613166, -72.87234888, 14), x_dir=(0, -0.05789386240267318, -0.9983227437537925), z_dir=(1, 0, 0))) as chamfer_1_piece_20a_section:
        with BuildLine():
            Line((3.109137869, 0), (-0.414994971, 5.361118731))
            Line((-0.414994971, 5.361118731), (-0.518743714, 5.355102224))
            ThreePointArc((-0.518743714, 5.355102224), (-0.259371857, 2.677551112), (-0.103748743, -0.006016507))
            Line((-0.103748743, -0.006016507), (0.006016507, -0.103748743))
            ThreePointArc((0.006016507, -0.103748743), (1.555374994, -0.013899696), (3.115154376, -0.103748743))
            Line((3.115154376, -0.103748743), (3.109137869, 0))
        make_face()
    chamfer_1_piece_20a = extrude(amount=91.437469901, mode=Mode.PRIVATE)
    chamfer_1_piece_20a = split(chamfer_1_piece_20a, bisect_by=Plane(origin=(35.381411989, -71.129651477, 13.037990314), z_dir=(1, 0, 0)), keep=Keep.TOP, mode=Mode.PRIVATE)
    with BuildSketch(Plane(origin=(35.381411989, -86.315240792, 14), x_dir=(0.0578938624026709, 0, -0.9983227437537926), z_dir=(0, 1, 0))) as chamfer_1_piece_20b_section:
        with BuildLine():
            Line((3.109137869, 0), (-0.414994971, 5.361118731))
            Line((-0.414994971, 5.361118731), (-0.518743714, 5.355102224))
            ThreePointArc((-0.518743714, 5.355102224), (-0.259371857, 2.677551112), (-0.103748743, -0.006016507))
            Line((-0.103748743, -0.006016507), (0.006016507, -0.103748743))
            ThreePointArc((0.006016507, -0.103748743), (1.555374994, -0.013899696), (3.115154376, -0.103748743))
            Line((3.115154376, -0.103748743), (3.109137869, 0))
        make_face()
    chamfer_1_piece_20b = extrude(amount=20.029798654, mode=Mode.PRIVATE)
    chamfer_1_piece_20b = split(chamfer_1_piece_20b, bisect_by=Plane(origin=(33.638714586, -72.87234888, 13.037990314), z_dir=(0, -1, 0)), keep=Keep.TOP, mode=Mode.PRIVATE)
    chamfer_1_piece_20 = chamfer_1_piece_20a & chamfer_1_piece_20b
    add(chamfer_1_piece_20, mode=Mode.SUBTRACT)
    with BuildSketch(Plane(origin=(35.381411989, -72.87234888, 14), x_dir=(0.0578938624026709, 0, -0.9983227437537926), z_dir=(0, 1, 0))) as chamfer_1_piece_21a_section:
        with BuildLine():
            Line((3.109137869, 0), (-0.414994971, 5.361118731))
            Line((-0.414994971, 5.361118731), (-0.518743714, 5.355102224))
            ThreePointArc((-0.518743714, 5.355102224), (-0.259371857, 2.677551112), (-0.103748743, -0.006016507))
            Line((-0.103748743, -0.006016507), (0.006016507, -0.103748743))
            ThreePointArc((0.006016507, -0.103748743), (1.555374994, -0.013899696), (3.115154376, -0.103748743))
            Line((3.115154376, -0.103748743), (3.109137869, 0))
        make_face()
    chamfer_1_piece_21a = extrude(amount=20.029798654, mode=Mode.PRIVATE)
    chamfer_1_piece_21a = split(chamfer_1_piece_21a, bisect_by=Plane(origin=(33.638714586, -66.285442138, 13.037990314), z_dir=(0, 1, 0)), keep=Keep.TOP, mode=Mode.PRIVATE)
    with BuildSketch(Plane(origin=(21.938520077, -66.285442138, 14), x_dir=(0, -0.05789386240267318, -0.9983227437537925), z_dir=(1, 0, 0))) as chamfer_1_piece_21b_section:
        with BuildLine():
            Line((3.109137869, 0), (-0.414994971, 5.361118731))
            Line((-0.414994971, 5.361118731), (-0.518743714, 5.355102224))
            ThreePointArc((-0.518743714, 5.355102224), (-0.259371857, 2.677551112), (-0.103748743, -0.006016507))
            Line((-0.103748743, -0.006016507), (0.006016507, -0.103748743))
            ThreePointArc((0.006016507, -0.103748743), (1.555374994, -0.013899696), (3.115154376, -0.103748743))
            Line((3.115154376, -0.103748743), (3.109137869, 0))
        make_face()
    chamfer_1_piece_21b = extrude(amount=21.841198009, mode=Mode.PRIVATE)
    chamfer_1_piece_21b = split(chamfer_1_piece_21b, bisect_by=Plane(origin=(35.381411989, -64.542744735, 13.037990314), z_dir=(-1, 0, 0)), keep=Keep.TOP, mode=Mode.PRIVATE)
    chamfer_1_piece_21 = chamfer_1_piece_21a & chamfer_1_piece_21b
    add(chamfer_1_piece_21, mode=Mode.SUBTRACT)
    with BuildSketch(Plane(origin=(35.381411989, -66.285442138, 14), x_dir=(0, -0.05789386240267318, -0.9983227437537925), z_dir=(1, 0, 0))) as chamfer_1_piece_22a_section:
        with BuildLine():
            Line((3.109137869, 0), (-0.414994971, 5.361118731))
            Line((-0.414994971, 5.361118731), (-0.518743714, 5.355102224))
            ThreePointArc((-0.518743714, 5.355102224), (-0.259371857, 2.677551112), (-0.103748743, -0.006016507))
            Line((-0.103748743, -0.006016507), (0.006016507, -0.103748743))
            ThreePointArc((0.006016507, -0.103748743), (1.555374994, -0.013899696), (3.115154376, -0.103748743))
            Line((3.115154376, -0.103748743), (3.109137869, 0))
        make_face()
    chamfer_1_piece_22a = extrude(amount=21.841198009, mode=Mode.PRIVATE)
    chamfer_1_piece_22a = split(chamfer_1_piece_22a, bisect_by=Plane(origin=(43.779718086, -64.542744735, 13.037990314), z_dir=(1, 0, 0)), keep=Keep.TOP, mode=Mode.PRIVATE)
    with BuildSketch(Plane(origin=(43.779718086, -79.728334049, 14), x_dir=(0.0578938624026709, 0, -0.9983227437537926), z_dir=(0, 1, 0))) as chamfer_1_piece_22b_section:
        with BuildLine():
            Line((3.109137869, 0), (-0.414994971, 5.361118731))
            Line((-0.414994971, 5.361118731), (-0.518743714, 5.355102224))
            ThreePointArc((-0.518743714, 5.355102224), (-0.259371857, 2.677551112), (-0.103748743, -0.006016507))
            Line((-0.103748743, -0.006016507), (0.006016507, -0.103748743))
            ThreePointArc((0.006016507, -0.103748743), (1.555374994, -0.013899696), (3.115154376, -0.103748743))
            Line((3.115154376, -0.103748743), (3.109137869, 0))
        make_face()
    chamfer_1_piece_22b = extrude(amount=51.751356777, mode=Mode.PRIVATE)
    chamfer_1_piece_22b = split(chamfer_1_piece_22b, bisect_by=Plane(origin=(42.037020683, -66.285442138, 13.037990314), z_dir=(0, -1, 0)), keep=Keep.TOP, mode=Mode.PRIVATE)
    chamfer_1_piece_22 = chamfer_1_piece_22a & chamfer_1_piece_22b
    add(chamfer_1_piece_22, mode=Mode.SUBTRACT)
    with BuildSketch(Plane(origin=(43.779718086, -66.285442138, 14), x_dir=(0.0578938624026709, 0, -0.9983227437537926), z_dir=(0, 1, 0))) as chamfer_1_piece_23a_section:
        with BuildLine():
            Line((3.109137869, 0), (-0.414994971, 5.361118731))
            Line((-0.414994971, 5.361118731), (-0.518743714, 5.355102224))
            ThreePointArc((-0.518743714, 5.355102224), (-0.259371857, 2.677551112), (-0.103748743, -0.006016507))
            Line((-0.103748743, -0.006016507), (0.006016507, -0.103748743))
            ThreePointArc((0.006016507, -0.103748743), (1.555374994, -0.013899696), (3.115154376, -0.103748743))
            Line((3.115154376, -0.103748743), (3.109137869, 0))
        make_face()
    chamfer_1_piece_23a = extrude(amount=38.308464865, mode=Mode.PRIVATE)
    chamfer_1_piece_23a = split(chamfer_1_piece_23a, bisect_by=Plane(origin=(39.390358101, -36.09660282, 12.978371613), z_dir=(0.7715393663129643, 0.6361815827492884, 0)), keep=Keep.TOP, mode=Mode.PRIVATE)
    with BuildSketch(Plane(origin=(52.331838339, -51.791589491, 14), x_dir=(0.04466739391156704, 0.036831009014801006, -0.9983227437537926), z_dir=(-0.6361815827492884, 0.7715393663129643, 0))) as chamfer_1_piece_23b_section:
        with BuildLine():
            Line((3.109137869, 0), (-0.414994971, 5.361118731))
            Line((-0.414994971, 5.361118731), (-0.518743714, 5.355102224))
            ThreePointArc((-0.518743714, 5.355102224), (-0.259371857, 2.677551112), (-0.103748743, -0.006016507))
            Line((-0.103748743, -0.006016507), (0.006016507, -0.103748743))
            ThreePointArc((0.006016507, -0.103748743), (1.555374994, -0.013899696), (3.115154376, -0.103748743))
            Line((3.115154376, -0.103748743), (3.109137869, 0))
        make_face()
    chamfer_1_piece_23b = extrude(amount=33.486341215, mode=Mode.PRIVATE)
    chamfer_1_piece_23b = split(chamfer_1_piece_23b, bisect_by=Plane(origin=(43.779718086, -48.319408724, 12.978371613), z_dir=(1, 0, 0)), keep=Keep.TOP, mode=Mode.PRIVATE)
    chamfer_1_piece_23 = chamfer_1_piece_23a & chamfer_1_piece_23b
    add(chamfer_1_piece_23, mode=Mode.SUBTRACT)
    with BuildSketch(Plane(origin=(52.331838339, -51.791589491, 14), x_dir=(0.04466739391156704, 0.036831009014801006, -0.9983227437537926), z_dir=(-0.6361815827492884, 0.7715393663129643, 0))) as chamfer_1_piece_24a_section:
        with BuildLine():
            Line((3.109137869, 0), (-0.414994971, 5.361118731))
            Line((-0.414994971, 5.361118731), (-0.518743714, 5.355102224))
            ThreePointArc((-0.518743714, 5.355102224), (-0.259371857, 2.677551112), (-0.103748743, -0.006016507))
            Line((-0.103748743, -0.006016507), (0.006016507, -0.103748743))
            ThreePointArc((0.006016507, -0.103748743), (1.555374994, -0.013899696), (3.115154376, -0.103748743))
            Line((3.115154376, -0.103748743), (3.109137869, 0))
        make_face()
    chamfer_1_piece_24a = extrude(amount=33.486341215, mode=Mode.PRIVATE)
    chamfer_1_piece_24a = split(chamfer_1_piece_24a, bisect_by=Plane(origin=(33.629213977, -36.327279317, 12.999739571), z_dir=(0, 1, 0)), keep=Keep.TOP, mode=Mode.PRIVATE)
    with BuildSketch(Plane(origin=(53.023456949, -36.327279317, 14), x_dir=(0, 0.0578938624026709, -0.9983227437537926), z_dir=(-1, 0, 0))) as chamfer_1_piece_24b_section:
        with BuildLine():
            Line((3.109137869, 0), (-0.414994971, 5.361118731))
            Line((-0.414994971, 5.361118731), (-0.518743714, 5.355102224))
            ThreePointArc((-0.518743714, 5.355102224), (-0.259371857, 2.677551112), (-0.103748743, -0.006016507))
            Line((-0.103748743, -0.006016507), (0.006016507, -0.103748743))
            ThreePointArc((0.006016507, -0.103748743), (1.555374994, -0.013899696), (3.115154376, -0.103748743))
            Line((3.115154376, -0.103748743), (3.109137869, 0))
        make_face()
    chamfer_1_piece_24b = extrude(amount=70.439058267, mode=Mode.PRIVATE)
    chamfer_1_piece_24b = split(chamfer_1_piece_24b, bisect_by=Plane(origin=(43.366704975, -40.918980943, 12.999739571), z_dir=(0.7715393663129643, 0.6361815827492884, 0)), keep=Keep.TOP, mode=Mode.PRIVATE)
    chamfer_1_piece_24 = chamfer_1_piece_24a & chamfer_1_piece_24b
    add(chamfer_1_piece_24, mode=Mode.SUBTRACT)
    with BuildSketch(Plane(origin=(-12.524829659, -25.95555901, 14), x_dir=(-0.04466739391156709, -0.03683100901480115, -0.9983227437537926), z_dir=(0.6361815827492894, -0.7715393663129635, 0))) as chamfer_1_piece_25a_section:
        with BuildLine():
            Line((3.109137869, 0), (-0.414994971, 5.361118731))
            Line((-0.414994971, 5.361118731), (-0.518743714, 5.355102224))
            ThreePointArc((-0.518743714, 5.355102224), (-0.259371857, 2.677551112), (-0.103748743, -0.006016507))
            Line((-0.103748743, -0.006016507), (0.006016507, -0.103748743))
            ThreePointArc((0.006016507, -0.103748743), (1.555374994, -0.013899696), (3.115154376, -0.103748743))
            Line((3.115154376, -0.103748743), (3.109137869, 0))
        make_face()
    chamfer_1_piece_25a = extrude(amount=29.431096805, mode=Mode.PRIVATE)
    chamfer_1_piece_25a = split(chamfer_1_piece_25a, bisect_by=Plane(origin=(3.597922896, -38.291088482, 12.999739571), z_dir=(0, -1, 0)), keep=Keep.TOP, mode=Mode.PRIVATE)
    with BuildSketch(Plane(origin=(11.089463747, -38.291088482, 14), x_dir=(0, 0.0578938624026709, -0.9983227437537926), z_dir=(-1, 0, 0))) as chamfer_1_piece_25b_section:
        with BuildLine():
            Line((3.109137869, 0), (-0.414994971, 5.361118731))
            Line((-0.414994971, 5.361118731), (-0.518743714, 5.355102224))
            ThreePointArc((-0.518743714, 5.355102224), (-0.259371857, 2.677551112), (-0.103748743, -0.006016507))
            Line((-0.103748743, -0.006016507), (0.006016507, -0.103748743))
            ThreePointArc((0.006016507, -0.103748743), (1.555374994, -0.013899696), (3.115154376, -0.103748743))
            Line((3.115154376, -0.103748743), (3.109137869, 0))
        make_face()
    chamfer_1_piece_25b = extrude(amount=47.999353257, mode=Mode.PRIVATE)
    chamfer_1_piece_25b = split(chamfer_1_piece_25b, bisect_by=Plane(origin=(1.432711772, -42.882790108, 12.999739571), z_dir=(0.7715393663129635, 0.6361815827492894, 0)), keep=Keep.TOP, mode=Mode.PRIVATE)
    chamfer_1_piece_25 = chamfer_1_piece_25a & chamfer_1_piece_25b
    add(chamfer_1_piece_25, mode=Mode.SUBTRACT)
    with BuildSketch(Plane(origin=(-36.909889511, -24.84819657, 14), x_dir=(-0.0578938624026709, 0, -0.9983227437537926), z_dir=(0, -1, 0))) as chamfer_1_piece_26a_section:
        with BuildLine():
            Line((3.109137869, 0), (-0.414994971, 5.361118731))
            Line((-0.414994971, 5.361118731), (-0.518743714, 5.355102224))
            ThreePointArc((-0.518743714, 5.355102224), (-0.259371857, 2.677551112), (-0.103748743, -0.006016507))
            Line((-0.103748743, -0.006016507), (0.006016507, -0.103748743))
            ThreePointArc((0.006016507, -0.103748743), (1.555374994, -0.013899696), (3.115154376, -0.103748743))
            Line((3.115154376, -0.103748743), (3.109137869, 0))
        make_face()
    chamfer_1_piece_26a = extrude(amount=24.475960706, mode=Mode.PRIVATE)
    chamfer_1_piece_26a = split(chamfer_1_piece_26a, bisect_by=Plane(origin=(-35.167192108, -38.291088482, 13.037990314), z_dir=(0, 1, 0)), keep=Keep.TOP, mode=Mode.PRIVATE)
    with BuildSketch(Plane(origin=(11.089463747, -38.291088482, 14), x_dir=(0, 0.0578938624026709, -0.9983227437537926), z_dir=(-1, 0, 0))) as chamfer_1_piece_26b_section:
        with BuildLine():
            Line((3.109137869, 0), (-0.414994971, 5.361118731))
            Line((-0.414994971, 5.361118731), (-0.518743714, 5.355102224))
            ThreePointArc((-0.518743714, 5.355102224), (-0.259371857, 2.677551112), (-0.103748743, -0.006016507))
            Line((-0.103748743, -0.006016507), (0.006016507, -0.103748743))
            ThreePointArc((0.006016507, -0.103748743), (1.555374994, -0.013899696), (3.115154376, -0.103748743))
            Line((3.115154376, -0.103748743), (3.109137869, 0))
        make_face()
    chamfer_1_piece_26b = extrude(amount=61.442245169, mode=Mode.PRIVATE)
    chamfer_1_piece_26b = split(chamfer_1_piece_26b, bisect_by=Plane(origin=(-36.909889511, -40.033785885, 13.037990314), z_dir=(-1, 0, 0)), keep=Keep.TOP, mode=Mode.PRIVATE)
    chamfer_1_piece_26 = chamfer_1_piece_26a & chamfer_1_piece_26b
    add(chamfer_1_piece_26, mode=Mode.SUBTRACT)


with BuildPart() as body_2:
    # Эскиз2 → Бобышка-Вытянуть2 (new body)
    with BuildSketch(Plane.XY):
        with Locations((-67.123183615, -74.790238099)):
            Circle(SKETCH_2_R)
    extrude(amount=EXTRUDE_2_DEPTH)


with BuildPart() as body_3:
    # Эскиз2 → Extrude 2 2 (new body)
    with BuildSketch(Plane.XY):
        with Locations((-67.123183615, -81.585318196)):
            Circle(SKETCH_2_R)
    extrude(amount=EXTRUDE_2_2_DEPTH)


with BuildPart() as body_4:
    # Эскиз2 → Extrude 2 3 (new body)
    with BuildSketch(Plane.XY):
        with Locations((-59.555935325, -81.585318196)):
            Circle(SKETCH_2_R)
    extrude(amount=EXTRUDE_2_3_DEPTH)


with BuildPart() as body_5:
    # Эскиз2 → Extrude 2 4 (new body)
    with BuildSketch(Plane.XY):
        with Locations((-42.207965026, 45.607198889)):
            Rectangle(SKETCH_2_W, SKETCH_2_H)
    extrude(amount=EXTRUDE_2_4_DEPTH)


with BuildPart() as body_6:
    # Эскиз2 → Extrude 2 5 (new body)
    with BuildSketch(Plane.XY):
        with Locations((-42.207965026, 54.107198889)):
            Rectangle(SKETCH_2_W, SKETCH_2_H)
    extrude(amount=EXTRUDE_2_5_DEPTH)


with BuildPart() as body_7:
    # Эскиз2 → Extrude 2 6 (new body)
    with BuildSketch(Plane.XY):
        with Locations((-42.207965026, 37.107198889)):
            Rectangle(SKETCH_2_W, SKETCH_2_H)
    extrude(amount=EXTRUDE_2_6_DEPTH)


with BuildPart() as body_8:
    # Эскиз2 → Extrude 2 7 (new body)
    with BuildSketch(Plane.XY):
        with Locations((-42.207965026, 28.607198889)):
            Rectangle(SKETCH_2_W, SKETCH_2_H)
    extrude(amount=EXTRUDE_2_7_DEPTH)


with BuildPart() as body_9:
    # Эскиз2 → Extrude 2 8 (new body)
    with BuildSketch(Plane.XY):
        with Locations((-42.207965026, 20.107198889)):
            Rectangle(SKETCH_2_W, SKETCH_2_H)
    extrude(amount=EXTRUDE_2_8_DEPTH)


with BuildPart() as body_10:
    # Эскиз2 → Extrude 2 9 (new body)
    with BuildSketch(Plane.XY):
        with Locations((-42.207965026, 11.607198889)):
            Rectangle(SKETCH_2_W, SKETCH_2_H)
    extrude(amount=EXTRUDE_2_9_DEPTH)


solid = Compound([part.part, body_2.part, body_3.part, body_4.part, body_5.part, body_6.part, body_7.part, body_8.part, body_9.part, body_10.part])
